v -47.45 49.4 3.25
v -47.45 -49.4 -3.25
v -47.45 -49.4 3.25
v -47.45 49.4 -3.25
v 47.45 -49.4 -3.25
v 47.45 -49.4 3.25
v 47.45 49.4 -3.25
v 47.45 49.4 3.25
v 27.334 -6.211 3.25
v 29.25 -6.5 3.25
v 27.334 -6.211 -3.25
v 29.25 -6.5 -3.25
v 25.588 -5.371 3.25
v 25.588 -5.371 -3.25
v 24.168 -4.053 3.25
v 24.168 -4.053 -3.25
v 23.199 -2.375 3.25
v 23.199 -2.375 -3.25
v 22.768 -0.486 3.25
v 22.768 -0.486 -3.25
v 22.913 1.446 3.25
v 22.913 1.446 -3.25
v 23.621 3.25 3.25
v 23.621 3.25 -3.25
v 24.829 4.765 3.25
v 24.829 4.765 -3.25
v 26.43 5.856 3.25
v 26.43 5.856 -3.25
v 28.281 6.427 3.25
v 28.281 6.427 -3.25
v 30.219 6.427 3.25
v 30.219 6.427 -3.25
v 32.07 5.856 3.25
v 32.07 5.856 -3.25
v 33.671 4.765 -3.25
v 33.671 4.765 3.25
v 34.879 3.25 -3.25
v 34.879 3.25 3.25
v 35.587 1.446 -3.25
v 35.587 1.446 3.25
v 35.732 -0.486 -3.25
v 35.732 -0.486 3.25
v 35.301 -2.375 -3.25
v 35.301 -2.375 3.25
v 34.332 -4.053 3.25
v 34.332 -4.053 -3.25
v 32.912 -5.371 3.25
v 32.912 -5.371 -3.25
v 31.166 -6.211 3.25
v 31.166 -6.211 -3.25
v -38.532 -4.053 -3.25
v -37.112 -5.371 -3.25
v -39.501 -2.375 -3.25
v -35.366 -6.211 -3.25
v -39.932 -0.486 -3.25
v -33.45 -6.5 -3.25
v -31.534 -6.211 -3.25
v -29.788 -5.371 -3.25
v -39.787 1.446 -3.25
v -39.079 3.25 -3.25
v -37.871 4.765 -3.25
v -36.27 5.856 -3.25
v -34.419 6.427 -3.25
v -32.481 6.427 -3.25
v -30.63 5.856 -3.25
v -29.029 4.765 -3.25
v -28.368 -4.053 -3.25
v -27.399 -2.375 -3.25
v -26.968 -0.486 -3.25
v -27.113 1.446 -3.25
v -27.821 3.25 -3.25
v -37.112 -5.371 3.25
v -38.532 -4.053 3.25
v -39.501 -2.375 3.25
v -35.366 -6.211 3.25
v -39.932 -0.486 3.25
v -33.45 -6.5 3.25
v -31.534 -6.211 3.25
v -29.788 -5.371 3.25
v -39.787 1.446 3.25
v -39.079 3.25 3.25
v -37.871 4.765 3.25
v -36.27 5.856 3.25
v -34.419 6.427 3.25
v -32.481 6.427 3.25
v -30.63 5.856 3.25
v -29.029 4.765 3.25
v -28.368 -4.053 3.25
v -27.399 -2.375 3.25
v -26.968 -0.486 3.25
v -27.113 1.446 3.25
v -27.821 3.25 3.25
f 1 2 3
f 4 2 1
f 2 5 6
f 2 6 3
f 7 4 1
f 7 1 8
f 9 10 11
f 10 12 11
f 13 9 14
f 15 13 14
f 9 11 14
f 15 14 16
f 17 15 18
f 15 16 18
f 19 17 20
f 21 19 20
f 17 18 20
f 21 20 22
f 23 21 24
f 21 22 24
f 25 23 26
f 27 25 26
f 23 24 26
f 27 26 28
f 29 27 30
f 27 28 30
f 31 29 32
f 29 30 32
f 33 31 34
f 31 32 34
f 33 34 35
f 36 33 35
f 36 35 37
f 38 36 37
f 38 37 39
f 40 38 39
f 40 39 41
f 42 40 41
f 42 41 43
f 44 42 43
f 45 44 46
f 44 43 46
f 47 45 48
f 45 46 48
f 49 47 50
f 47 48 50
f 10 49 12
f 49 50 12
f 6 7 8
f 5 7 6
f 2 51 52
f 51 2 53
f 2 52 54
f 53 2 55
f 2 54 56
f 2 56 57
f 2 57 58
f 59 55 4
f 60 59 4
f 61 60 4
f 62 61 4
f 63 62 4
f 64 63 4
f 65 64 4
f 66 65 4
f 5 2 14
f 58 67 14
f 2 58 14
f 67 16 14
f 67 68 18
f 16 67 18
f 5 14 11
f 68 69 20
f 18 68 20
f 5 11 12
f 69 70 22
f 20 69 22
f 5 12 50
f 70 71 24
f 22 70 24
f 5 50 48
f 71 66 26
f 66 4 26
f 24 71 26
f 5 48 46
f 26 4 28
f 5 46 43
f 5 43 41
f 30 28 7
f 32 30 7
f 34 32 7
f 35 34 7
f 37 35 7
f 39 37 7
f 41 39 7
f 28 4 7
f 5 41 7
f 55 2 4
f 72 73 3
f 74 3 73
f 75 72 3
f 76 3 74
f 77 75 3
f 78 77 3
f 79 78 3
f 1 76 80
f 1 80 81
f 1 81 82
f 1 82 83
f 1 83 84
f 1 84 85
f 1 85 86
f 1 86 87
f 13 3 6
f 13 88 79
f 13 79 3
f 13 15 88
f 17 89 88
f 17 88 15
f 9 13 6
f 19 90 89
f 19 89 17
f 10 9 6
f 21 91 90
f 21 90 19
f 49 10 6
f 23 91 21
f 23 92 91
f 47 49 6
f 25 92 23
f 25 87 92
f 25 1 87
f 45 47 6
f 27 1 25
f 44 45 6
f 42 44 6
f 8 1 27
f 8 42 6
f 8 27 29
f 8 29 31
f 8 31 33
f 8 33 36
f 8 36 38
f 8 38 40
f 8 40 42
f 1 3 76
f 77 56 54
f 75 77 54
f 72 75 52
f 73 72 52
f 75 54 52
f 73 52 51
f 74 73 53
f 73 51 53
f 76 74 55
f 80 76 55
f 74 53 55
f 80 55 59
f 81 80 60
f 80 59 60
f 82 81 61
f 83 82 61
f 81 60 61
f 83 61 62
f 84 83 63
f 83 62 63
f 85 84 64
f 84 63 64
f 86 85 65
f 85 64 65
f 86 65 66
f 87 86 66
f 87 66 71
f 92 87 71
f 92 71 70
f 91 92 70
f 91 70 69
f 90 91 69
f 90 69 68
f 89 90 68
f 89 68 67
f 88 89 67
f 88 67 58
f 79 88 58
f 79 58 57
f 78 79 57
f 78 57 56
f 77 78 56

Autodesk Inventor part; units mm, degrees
ref_plane "YZ Plane" through (0, 0, 0) normal (1, 0, 0) x (0, 1, 0)
ref_plane "XZ Plane" through (0, 0, 0) normal (0, 1, 0) x (-1, 0, 0)
ref_plane "XY Plane" through (0, 0, 0) normal (0, 0, 1) x (1, 0, 0)
sketch "Sketch1" plane through (0, 0, 0) normal (0, 0, 1) x (1, 0, 0)
  line L0 (-47.45, 49.4) -> (47.45, 49.4)
  line L1 (47.45, 49.4) -> (47.45, -49.4)
  line L2 (47.45, -49.4) -> (-47.45, -49.4)
  line L3 (-47.45, -49.4) -> (-47.45, 49.4)
  line L4 (-47.45, 49.4) -> (47.45, -49.4) construction
  line L5 (47.45, 49.4) -> (-47.45, -49.4) construction
  point P0 (0, 0)
  dimension "Comp" = 94.9
  dimension "Larg" = 98.8
extrude "Extrusion1" add sketch "Sketch1" along normal mid plane 6.5
hole "Hole2" at (-33.45, 0, 3.25) direction (0, 0, -1) diameter 13 end through all
hole "Hole3" at (29.25, 0, 3.25) direction (0, 0, -1) diameter 13 end through all
properties part number "Buste3"
